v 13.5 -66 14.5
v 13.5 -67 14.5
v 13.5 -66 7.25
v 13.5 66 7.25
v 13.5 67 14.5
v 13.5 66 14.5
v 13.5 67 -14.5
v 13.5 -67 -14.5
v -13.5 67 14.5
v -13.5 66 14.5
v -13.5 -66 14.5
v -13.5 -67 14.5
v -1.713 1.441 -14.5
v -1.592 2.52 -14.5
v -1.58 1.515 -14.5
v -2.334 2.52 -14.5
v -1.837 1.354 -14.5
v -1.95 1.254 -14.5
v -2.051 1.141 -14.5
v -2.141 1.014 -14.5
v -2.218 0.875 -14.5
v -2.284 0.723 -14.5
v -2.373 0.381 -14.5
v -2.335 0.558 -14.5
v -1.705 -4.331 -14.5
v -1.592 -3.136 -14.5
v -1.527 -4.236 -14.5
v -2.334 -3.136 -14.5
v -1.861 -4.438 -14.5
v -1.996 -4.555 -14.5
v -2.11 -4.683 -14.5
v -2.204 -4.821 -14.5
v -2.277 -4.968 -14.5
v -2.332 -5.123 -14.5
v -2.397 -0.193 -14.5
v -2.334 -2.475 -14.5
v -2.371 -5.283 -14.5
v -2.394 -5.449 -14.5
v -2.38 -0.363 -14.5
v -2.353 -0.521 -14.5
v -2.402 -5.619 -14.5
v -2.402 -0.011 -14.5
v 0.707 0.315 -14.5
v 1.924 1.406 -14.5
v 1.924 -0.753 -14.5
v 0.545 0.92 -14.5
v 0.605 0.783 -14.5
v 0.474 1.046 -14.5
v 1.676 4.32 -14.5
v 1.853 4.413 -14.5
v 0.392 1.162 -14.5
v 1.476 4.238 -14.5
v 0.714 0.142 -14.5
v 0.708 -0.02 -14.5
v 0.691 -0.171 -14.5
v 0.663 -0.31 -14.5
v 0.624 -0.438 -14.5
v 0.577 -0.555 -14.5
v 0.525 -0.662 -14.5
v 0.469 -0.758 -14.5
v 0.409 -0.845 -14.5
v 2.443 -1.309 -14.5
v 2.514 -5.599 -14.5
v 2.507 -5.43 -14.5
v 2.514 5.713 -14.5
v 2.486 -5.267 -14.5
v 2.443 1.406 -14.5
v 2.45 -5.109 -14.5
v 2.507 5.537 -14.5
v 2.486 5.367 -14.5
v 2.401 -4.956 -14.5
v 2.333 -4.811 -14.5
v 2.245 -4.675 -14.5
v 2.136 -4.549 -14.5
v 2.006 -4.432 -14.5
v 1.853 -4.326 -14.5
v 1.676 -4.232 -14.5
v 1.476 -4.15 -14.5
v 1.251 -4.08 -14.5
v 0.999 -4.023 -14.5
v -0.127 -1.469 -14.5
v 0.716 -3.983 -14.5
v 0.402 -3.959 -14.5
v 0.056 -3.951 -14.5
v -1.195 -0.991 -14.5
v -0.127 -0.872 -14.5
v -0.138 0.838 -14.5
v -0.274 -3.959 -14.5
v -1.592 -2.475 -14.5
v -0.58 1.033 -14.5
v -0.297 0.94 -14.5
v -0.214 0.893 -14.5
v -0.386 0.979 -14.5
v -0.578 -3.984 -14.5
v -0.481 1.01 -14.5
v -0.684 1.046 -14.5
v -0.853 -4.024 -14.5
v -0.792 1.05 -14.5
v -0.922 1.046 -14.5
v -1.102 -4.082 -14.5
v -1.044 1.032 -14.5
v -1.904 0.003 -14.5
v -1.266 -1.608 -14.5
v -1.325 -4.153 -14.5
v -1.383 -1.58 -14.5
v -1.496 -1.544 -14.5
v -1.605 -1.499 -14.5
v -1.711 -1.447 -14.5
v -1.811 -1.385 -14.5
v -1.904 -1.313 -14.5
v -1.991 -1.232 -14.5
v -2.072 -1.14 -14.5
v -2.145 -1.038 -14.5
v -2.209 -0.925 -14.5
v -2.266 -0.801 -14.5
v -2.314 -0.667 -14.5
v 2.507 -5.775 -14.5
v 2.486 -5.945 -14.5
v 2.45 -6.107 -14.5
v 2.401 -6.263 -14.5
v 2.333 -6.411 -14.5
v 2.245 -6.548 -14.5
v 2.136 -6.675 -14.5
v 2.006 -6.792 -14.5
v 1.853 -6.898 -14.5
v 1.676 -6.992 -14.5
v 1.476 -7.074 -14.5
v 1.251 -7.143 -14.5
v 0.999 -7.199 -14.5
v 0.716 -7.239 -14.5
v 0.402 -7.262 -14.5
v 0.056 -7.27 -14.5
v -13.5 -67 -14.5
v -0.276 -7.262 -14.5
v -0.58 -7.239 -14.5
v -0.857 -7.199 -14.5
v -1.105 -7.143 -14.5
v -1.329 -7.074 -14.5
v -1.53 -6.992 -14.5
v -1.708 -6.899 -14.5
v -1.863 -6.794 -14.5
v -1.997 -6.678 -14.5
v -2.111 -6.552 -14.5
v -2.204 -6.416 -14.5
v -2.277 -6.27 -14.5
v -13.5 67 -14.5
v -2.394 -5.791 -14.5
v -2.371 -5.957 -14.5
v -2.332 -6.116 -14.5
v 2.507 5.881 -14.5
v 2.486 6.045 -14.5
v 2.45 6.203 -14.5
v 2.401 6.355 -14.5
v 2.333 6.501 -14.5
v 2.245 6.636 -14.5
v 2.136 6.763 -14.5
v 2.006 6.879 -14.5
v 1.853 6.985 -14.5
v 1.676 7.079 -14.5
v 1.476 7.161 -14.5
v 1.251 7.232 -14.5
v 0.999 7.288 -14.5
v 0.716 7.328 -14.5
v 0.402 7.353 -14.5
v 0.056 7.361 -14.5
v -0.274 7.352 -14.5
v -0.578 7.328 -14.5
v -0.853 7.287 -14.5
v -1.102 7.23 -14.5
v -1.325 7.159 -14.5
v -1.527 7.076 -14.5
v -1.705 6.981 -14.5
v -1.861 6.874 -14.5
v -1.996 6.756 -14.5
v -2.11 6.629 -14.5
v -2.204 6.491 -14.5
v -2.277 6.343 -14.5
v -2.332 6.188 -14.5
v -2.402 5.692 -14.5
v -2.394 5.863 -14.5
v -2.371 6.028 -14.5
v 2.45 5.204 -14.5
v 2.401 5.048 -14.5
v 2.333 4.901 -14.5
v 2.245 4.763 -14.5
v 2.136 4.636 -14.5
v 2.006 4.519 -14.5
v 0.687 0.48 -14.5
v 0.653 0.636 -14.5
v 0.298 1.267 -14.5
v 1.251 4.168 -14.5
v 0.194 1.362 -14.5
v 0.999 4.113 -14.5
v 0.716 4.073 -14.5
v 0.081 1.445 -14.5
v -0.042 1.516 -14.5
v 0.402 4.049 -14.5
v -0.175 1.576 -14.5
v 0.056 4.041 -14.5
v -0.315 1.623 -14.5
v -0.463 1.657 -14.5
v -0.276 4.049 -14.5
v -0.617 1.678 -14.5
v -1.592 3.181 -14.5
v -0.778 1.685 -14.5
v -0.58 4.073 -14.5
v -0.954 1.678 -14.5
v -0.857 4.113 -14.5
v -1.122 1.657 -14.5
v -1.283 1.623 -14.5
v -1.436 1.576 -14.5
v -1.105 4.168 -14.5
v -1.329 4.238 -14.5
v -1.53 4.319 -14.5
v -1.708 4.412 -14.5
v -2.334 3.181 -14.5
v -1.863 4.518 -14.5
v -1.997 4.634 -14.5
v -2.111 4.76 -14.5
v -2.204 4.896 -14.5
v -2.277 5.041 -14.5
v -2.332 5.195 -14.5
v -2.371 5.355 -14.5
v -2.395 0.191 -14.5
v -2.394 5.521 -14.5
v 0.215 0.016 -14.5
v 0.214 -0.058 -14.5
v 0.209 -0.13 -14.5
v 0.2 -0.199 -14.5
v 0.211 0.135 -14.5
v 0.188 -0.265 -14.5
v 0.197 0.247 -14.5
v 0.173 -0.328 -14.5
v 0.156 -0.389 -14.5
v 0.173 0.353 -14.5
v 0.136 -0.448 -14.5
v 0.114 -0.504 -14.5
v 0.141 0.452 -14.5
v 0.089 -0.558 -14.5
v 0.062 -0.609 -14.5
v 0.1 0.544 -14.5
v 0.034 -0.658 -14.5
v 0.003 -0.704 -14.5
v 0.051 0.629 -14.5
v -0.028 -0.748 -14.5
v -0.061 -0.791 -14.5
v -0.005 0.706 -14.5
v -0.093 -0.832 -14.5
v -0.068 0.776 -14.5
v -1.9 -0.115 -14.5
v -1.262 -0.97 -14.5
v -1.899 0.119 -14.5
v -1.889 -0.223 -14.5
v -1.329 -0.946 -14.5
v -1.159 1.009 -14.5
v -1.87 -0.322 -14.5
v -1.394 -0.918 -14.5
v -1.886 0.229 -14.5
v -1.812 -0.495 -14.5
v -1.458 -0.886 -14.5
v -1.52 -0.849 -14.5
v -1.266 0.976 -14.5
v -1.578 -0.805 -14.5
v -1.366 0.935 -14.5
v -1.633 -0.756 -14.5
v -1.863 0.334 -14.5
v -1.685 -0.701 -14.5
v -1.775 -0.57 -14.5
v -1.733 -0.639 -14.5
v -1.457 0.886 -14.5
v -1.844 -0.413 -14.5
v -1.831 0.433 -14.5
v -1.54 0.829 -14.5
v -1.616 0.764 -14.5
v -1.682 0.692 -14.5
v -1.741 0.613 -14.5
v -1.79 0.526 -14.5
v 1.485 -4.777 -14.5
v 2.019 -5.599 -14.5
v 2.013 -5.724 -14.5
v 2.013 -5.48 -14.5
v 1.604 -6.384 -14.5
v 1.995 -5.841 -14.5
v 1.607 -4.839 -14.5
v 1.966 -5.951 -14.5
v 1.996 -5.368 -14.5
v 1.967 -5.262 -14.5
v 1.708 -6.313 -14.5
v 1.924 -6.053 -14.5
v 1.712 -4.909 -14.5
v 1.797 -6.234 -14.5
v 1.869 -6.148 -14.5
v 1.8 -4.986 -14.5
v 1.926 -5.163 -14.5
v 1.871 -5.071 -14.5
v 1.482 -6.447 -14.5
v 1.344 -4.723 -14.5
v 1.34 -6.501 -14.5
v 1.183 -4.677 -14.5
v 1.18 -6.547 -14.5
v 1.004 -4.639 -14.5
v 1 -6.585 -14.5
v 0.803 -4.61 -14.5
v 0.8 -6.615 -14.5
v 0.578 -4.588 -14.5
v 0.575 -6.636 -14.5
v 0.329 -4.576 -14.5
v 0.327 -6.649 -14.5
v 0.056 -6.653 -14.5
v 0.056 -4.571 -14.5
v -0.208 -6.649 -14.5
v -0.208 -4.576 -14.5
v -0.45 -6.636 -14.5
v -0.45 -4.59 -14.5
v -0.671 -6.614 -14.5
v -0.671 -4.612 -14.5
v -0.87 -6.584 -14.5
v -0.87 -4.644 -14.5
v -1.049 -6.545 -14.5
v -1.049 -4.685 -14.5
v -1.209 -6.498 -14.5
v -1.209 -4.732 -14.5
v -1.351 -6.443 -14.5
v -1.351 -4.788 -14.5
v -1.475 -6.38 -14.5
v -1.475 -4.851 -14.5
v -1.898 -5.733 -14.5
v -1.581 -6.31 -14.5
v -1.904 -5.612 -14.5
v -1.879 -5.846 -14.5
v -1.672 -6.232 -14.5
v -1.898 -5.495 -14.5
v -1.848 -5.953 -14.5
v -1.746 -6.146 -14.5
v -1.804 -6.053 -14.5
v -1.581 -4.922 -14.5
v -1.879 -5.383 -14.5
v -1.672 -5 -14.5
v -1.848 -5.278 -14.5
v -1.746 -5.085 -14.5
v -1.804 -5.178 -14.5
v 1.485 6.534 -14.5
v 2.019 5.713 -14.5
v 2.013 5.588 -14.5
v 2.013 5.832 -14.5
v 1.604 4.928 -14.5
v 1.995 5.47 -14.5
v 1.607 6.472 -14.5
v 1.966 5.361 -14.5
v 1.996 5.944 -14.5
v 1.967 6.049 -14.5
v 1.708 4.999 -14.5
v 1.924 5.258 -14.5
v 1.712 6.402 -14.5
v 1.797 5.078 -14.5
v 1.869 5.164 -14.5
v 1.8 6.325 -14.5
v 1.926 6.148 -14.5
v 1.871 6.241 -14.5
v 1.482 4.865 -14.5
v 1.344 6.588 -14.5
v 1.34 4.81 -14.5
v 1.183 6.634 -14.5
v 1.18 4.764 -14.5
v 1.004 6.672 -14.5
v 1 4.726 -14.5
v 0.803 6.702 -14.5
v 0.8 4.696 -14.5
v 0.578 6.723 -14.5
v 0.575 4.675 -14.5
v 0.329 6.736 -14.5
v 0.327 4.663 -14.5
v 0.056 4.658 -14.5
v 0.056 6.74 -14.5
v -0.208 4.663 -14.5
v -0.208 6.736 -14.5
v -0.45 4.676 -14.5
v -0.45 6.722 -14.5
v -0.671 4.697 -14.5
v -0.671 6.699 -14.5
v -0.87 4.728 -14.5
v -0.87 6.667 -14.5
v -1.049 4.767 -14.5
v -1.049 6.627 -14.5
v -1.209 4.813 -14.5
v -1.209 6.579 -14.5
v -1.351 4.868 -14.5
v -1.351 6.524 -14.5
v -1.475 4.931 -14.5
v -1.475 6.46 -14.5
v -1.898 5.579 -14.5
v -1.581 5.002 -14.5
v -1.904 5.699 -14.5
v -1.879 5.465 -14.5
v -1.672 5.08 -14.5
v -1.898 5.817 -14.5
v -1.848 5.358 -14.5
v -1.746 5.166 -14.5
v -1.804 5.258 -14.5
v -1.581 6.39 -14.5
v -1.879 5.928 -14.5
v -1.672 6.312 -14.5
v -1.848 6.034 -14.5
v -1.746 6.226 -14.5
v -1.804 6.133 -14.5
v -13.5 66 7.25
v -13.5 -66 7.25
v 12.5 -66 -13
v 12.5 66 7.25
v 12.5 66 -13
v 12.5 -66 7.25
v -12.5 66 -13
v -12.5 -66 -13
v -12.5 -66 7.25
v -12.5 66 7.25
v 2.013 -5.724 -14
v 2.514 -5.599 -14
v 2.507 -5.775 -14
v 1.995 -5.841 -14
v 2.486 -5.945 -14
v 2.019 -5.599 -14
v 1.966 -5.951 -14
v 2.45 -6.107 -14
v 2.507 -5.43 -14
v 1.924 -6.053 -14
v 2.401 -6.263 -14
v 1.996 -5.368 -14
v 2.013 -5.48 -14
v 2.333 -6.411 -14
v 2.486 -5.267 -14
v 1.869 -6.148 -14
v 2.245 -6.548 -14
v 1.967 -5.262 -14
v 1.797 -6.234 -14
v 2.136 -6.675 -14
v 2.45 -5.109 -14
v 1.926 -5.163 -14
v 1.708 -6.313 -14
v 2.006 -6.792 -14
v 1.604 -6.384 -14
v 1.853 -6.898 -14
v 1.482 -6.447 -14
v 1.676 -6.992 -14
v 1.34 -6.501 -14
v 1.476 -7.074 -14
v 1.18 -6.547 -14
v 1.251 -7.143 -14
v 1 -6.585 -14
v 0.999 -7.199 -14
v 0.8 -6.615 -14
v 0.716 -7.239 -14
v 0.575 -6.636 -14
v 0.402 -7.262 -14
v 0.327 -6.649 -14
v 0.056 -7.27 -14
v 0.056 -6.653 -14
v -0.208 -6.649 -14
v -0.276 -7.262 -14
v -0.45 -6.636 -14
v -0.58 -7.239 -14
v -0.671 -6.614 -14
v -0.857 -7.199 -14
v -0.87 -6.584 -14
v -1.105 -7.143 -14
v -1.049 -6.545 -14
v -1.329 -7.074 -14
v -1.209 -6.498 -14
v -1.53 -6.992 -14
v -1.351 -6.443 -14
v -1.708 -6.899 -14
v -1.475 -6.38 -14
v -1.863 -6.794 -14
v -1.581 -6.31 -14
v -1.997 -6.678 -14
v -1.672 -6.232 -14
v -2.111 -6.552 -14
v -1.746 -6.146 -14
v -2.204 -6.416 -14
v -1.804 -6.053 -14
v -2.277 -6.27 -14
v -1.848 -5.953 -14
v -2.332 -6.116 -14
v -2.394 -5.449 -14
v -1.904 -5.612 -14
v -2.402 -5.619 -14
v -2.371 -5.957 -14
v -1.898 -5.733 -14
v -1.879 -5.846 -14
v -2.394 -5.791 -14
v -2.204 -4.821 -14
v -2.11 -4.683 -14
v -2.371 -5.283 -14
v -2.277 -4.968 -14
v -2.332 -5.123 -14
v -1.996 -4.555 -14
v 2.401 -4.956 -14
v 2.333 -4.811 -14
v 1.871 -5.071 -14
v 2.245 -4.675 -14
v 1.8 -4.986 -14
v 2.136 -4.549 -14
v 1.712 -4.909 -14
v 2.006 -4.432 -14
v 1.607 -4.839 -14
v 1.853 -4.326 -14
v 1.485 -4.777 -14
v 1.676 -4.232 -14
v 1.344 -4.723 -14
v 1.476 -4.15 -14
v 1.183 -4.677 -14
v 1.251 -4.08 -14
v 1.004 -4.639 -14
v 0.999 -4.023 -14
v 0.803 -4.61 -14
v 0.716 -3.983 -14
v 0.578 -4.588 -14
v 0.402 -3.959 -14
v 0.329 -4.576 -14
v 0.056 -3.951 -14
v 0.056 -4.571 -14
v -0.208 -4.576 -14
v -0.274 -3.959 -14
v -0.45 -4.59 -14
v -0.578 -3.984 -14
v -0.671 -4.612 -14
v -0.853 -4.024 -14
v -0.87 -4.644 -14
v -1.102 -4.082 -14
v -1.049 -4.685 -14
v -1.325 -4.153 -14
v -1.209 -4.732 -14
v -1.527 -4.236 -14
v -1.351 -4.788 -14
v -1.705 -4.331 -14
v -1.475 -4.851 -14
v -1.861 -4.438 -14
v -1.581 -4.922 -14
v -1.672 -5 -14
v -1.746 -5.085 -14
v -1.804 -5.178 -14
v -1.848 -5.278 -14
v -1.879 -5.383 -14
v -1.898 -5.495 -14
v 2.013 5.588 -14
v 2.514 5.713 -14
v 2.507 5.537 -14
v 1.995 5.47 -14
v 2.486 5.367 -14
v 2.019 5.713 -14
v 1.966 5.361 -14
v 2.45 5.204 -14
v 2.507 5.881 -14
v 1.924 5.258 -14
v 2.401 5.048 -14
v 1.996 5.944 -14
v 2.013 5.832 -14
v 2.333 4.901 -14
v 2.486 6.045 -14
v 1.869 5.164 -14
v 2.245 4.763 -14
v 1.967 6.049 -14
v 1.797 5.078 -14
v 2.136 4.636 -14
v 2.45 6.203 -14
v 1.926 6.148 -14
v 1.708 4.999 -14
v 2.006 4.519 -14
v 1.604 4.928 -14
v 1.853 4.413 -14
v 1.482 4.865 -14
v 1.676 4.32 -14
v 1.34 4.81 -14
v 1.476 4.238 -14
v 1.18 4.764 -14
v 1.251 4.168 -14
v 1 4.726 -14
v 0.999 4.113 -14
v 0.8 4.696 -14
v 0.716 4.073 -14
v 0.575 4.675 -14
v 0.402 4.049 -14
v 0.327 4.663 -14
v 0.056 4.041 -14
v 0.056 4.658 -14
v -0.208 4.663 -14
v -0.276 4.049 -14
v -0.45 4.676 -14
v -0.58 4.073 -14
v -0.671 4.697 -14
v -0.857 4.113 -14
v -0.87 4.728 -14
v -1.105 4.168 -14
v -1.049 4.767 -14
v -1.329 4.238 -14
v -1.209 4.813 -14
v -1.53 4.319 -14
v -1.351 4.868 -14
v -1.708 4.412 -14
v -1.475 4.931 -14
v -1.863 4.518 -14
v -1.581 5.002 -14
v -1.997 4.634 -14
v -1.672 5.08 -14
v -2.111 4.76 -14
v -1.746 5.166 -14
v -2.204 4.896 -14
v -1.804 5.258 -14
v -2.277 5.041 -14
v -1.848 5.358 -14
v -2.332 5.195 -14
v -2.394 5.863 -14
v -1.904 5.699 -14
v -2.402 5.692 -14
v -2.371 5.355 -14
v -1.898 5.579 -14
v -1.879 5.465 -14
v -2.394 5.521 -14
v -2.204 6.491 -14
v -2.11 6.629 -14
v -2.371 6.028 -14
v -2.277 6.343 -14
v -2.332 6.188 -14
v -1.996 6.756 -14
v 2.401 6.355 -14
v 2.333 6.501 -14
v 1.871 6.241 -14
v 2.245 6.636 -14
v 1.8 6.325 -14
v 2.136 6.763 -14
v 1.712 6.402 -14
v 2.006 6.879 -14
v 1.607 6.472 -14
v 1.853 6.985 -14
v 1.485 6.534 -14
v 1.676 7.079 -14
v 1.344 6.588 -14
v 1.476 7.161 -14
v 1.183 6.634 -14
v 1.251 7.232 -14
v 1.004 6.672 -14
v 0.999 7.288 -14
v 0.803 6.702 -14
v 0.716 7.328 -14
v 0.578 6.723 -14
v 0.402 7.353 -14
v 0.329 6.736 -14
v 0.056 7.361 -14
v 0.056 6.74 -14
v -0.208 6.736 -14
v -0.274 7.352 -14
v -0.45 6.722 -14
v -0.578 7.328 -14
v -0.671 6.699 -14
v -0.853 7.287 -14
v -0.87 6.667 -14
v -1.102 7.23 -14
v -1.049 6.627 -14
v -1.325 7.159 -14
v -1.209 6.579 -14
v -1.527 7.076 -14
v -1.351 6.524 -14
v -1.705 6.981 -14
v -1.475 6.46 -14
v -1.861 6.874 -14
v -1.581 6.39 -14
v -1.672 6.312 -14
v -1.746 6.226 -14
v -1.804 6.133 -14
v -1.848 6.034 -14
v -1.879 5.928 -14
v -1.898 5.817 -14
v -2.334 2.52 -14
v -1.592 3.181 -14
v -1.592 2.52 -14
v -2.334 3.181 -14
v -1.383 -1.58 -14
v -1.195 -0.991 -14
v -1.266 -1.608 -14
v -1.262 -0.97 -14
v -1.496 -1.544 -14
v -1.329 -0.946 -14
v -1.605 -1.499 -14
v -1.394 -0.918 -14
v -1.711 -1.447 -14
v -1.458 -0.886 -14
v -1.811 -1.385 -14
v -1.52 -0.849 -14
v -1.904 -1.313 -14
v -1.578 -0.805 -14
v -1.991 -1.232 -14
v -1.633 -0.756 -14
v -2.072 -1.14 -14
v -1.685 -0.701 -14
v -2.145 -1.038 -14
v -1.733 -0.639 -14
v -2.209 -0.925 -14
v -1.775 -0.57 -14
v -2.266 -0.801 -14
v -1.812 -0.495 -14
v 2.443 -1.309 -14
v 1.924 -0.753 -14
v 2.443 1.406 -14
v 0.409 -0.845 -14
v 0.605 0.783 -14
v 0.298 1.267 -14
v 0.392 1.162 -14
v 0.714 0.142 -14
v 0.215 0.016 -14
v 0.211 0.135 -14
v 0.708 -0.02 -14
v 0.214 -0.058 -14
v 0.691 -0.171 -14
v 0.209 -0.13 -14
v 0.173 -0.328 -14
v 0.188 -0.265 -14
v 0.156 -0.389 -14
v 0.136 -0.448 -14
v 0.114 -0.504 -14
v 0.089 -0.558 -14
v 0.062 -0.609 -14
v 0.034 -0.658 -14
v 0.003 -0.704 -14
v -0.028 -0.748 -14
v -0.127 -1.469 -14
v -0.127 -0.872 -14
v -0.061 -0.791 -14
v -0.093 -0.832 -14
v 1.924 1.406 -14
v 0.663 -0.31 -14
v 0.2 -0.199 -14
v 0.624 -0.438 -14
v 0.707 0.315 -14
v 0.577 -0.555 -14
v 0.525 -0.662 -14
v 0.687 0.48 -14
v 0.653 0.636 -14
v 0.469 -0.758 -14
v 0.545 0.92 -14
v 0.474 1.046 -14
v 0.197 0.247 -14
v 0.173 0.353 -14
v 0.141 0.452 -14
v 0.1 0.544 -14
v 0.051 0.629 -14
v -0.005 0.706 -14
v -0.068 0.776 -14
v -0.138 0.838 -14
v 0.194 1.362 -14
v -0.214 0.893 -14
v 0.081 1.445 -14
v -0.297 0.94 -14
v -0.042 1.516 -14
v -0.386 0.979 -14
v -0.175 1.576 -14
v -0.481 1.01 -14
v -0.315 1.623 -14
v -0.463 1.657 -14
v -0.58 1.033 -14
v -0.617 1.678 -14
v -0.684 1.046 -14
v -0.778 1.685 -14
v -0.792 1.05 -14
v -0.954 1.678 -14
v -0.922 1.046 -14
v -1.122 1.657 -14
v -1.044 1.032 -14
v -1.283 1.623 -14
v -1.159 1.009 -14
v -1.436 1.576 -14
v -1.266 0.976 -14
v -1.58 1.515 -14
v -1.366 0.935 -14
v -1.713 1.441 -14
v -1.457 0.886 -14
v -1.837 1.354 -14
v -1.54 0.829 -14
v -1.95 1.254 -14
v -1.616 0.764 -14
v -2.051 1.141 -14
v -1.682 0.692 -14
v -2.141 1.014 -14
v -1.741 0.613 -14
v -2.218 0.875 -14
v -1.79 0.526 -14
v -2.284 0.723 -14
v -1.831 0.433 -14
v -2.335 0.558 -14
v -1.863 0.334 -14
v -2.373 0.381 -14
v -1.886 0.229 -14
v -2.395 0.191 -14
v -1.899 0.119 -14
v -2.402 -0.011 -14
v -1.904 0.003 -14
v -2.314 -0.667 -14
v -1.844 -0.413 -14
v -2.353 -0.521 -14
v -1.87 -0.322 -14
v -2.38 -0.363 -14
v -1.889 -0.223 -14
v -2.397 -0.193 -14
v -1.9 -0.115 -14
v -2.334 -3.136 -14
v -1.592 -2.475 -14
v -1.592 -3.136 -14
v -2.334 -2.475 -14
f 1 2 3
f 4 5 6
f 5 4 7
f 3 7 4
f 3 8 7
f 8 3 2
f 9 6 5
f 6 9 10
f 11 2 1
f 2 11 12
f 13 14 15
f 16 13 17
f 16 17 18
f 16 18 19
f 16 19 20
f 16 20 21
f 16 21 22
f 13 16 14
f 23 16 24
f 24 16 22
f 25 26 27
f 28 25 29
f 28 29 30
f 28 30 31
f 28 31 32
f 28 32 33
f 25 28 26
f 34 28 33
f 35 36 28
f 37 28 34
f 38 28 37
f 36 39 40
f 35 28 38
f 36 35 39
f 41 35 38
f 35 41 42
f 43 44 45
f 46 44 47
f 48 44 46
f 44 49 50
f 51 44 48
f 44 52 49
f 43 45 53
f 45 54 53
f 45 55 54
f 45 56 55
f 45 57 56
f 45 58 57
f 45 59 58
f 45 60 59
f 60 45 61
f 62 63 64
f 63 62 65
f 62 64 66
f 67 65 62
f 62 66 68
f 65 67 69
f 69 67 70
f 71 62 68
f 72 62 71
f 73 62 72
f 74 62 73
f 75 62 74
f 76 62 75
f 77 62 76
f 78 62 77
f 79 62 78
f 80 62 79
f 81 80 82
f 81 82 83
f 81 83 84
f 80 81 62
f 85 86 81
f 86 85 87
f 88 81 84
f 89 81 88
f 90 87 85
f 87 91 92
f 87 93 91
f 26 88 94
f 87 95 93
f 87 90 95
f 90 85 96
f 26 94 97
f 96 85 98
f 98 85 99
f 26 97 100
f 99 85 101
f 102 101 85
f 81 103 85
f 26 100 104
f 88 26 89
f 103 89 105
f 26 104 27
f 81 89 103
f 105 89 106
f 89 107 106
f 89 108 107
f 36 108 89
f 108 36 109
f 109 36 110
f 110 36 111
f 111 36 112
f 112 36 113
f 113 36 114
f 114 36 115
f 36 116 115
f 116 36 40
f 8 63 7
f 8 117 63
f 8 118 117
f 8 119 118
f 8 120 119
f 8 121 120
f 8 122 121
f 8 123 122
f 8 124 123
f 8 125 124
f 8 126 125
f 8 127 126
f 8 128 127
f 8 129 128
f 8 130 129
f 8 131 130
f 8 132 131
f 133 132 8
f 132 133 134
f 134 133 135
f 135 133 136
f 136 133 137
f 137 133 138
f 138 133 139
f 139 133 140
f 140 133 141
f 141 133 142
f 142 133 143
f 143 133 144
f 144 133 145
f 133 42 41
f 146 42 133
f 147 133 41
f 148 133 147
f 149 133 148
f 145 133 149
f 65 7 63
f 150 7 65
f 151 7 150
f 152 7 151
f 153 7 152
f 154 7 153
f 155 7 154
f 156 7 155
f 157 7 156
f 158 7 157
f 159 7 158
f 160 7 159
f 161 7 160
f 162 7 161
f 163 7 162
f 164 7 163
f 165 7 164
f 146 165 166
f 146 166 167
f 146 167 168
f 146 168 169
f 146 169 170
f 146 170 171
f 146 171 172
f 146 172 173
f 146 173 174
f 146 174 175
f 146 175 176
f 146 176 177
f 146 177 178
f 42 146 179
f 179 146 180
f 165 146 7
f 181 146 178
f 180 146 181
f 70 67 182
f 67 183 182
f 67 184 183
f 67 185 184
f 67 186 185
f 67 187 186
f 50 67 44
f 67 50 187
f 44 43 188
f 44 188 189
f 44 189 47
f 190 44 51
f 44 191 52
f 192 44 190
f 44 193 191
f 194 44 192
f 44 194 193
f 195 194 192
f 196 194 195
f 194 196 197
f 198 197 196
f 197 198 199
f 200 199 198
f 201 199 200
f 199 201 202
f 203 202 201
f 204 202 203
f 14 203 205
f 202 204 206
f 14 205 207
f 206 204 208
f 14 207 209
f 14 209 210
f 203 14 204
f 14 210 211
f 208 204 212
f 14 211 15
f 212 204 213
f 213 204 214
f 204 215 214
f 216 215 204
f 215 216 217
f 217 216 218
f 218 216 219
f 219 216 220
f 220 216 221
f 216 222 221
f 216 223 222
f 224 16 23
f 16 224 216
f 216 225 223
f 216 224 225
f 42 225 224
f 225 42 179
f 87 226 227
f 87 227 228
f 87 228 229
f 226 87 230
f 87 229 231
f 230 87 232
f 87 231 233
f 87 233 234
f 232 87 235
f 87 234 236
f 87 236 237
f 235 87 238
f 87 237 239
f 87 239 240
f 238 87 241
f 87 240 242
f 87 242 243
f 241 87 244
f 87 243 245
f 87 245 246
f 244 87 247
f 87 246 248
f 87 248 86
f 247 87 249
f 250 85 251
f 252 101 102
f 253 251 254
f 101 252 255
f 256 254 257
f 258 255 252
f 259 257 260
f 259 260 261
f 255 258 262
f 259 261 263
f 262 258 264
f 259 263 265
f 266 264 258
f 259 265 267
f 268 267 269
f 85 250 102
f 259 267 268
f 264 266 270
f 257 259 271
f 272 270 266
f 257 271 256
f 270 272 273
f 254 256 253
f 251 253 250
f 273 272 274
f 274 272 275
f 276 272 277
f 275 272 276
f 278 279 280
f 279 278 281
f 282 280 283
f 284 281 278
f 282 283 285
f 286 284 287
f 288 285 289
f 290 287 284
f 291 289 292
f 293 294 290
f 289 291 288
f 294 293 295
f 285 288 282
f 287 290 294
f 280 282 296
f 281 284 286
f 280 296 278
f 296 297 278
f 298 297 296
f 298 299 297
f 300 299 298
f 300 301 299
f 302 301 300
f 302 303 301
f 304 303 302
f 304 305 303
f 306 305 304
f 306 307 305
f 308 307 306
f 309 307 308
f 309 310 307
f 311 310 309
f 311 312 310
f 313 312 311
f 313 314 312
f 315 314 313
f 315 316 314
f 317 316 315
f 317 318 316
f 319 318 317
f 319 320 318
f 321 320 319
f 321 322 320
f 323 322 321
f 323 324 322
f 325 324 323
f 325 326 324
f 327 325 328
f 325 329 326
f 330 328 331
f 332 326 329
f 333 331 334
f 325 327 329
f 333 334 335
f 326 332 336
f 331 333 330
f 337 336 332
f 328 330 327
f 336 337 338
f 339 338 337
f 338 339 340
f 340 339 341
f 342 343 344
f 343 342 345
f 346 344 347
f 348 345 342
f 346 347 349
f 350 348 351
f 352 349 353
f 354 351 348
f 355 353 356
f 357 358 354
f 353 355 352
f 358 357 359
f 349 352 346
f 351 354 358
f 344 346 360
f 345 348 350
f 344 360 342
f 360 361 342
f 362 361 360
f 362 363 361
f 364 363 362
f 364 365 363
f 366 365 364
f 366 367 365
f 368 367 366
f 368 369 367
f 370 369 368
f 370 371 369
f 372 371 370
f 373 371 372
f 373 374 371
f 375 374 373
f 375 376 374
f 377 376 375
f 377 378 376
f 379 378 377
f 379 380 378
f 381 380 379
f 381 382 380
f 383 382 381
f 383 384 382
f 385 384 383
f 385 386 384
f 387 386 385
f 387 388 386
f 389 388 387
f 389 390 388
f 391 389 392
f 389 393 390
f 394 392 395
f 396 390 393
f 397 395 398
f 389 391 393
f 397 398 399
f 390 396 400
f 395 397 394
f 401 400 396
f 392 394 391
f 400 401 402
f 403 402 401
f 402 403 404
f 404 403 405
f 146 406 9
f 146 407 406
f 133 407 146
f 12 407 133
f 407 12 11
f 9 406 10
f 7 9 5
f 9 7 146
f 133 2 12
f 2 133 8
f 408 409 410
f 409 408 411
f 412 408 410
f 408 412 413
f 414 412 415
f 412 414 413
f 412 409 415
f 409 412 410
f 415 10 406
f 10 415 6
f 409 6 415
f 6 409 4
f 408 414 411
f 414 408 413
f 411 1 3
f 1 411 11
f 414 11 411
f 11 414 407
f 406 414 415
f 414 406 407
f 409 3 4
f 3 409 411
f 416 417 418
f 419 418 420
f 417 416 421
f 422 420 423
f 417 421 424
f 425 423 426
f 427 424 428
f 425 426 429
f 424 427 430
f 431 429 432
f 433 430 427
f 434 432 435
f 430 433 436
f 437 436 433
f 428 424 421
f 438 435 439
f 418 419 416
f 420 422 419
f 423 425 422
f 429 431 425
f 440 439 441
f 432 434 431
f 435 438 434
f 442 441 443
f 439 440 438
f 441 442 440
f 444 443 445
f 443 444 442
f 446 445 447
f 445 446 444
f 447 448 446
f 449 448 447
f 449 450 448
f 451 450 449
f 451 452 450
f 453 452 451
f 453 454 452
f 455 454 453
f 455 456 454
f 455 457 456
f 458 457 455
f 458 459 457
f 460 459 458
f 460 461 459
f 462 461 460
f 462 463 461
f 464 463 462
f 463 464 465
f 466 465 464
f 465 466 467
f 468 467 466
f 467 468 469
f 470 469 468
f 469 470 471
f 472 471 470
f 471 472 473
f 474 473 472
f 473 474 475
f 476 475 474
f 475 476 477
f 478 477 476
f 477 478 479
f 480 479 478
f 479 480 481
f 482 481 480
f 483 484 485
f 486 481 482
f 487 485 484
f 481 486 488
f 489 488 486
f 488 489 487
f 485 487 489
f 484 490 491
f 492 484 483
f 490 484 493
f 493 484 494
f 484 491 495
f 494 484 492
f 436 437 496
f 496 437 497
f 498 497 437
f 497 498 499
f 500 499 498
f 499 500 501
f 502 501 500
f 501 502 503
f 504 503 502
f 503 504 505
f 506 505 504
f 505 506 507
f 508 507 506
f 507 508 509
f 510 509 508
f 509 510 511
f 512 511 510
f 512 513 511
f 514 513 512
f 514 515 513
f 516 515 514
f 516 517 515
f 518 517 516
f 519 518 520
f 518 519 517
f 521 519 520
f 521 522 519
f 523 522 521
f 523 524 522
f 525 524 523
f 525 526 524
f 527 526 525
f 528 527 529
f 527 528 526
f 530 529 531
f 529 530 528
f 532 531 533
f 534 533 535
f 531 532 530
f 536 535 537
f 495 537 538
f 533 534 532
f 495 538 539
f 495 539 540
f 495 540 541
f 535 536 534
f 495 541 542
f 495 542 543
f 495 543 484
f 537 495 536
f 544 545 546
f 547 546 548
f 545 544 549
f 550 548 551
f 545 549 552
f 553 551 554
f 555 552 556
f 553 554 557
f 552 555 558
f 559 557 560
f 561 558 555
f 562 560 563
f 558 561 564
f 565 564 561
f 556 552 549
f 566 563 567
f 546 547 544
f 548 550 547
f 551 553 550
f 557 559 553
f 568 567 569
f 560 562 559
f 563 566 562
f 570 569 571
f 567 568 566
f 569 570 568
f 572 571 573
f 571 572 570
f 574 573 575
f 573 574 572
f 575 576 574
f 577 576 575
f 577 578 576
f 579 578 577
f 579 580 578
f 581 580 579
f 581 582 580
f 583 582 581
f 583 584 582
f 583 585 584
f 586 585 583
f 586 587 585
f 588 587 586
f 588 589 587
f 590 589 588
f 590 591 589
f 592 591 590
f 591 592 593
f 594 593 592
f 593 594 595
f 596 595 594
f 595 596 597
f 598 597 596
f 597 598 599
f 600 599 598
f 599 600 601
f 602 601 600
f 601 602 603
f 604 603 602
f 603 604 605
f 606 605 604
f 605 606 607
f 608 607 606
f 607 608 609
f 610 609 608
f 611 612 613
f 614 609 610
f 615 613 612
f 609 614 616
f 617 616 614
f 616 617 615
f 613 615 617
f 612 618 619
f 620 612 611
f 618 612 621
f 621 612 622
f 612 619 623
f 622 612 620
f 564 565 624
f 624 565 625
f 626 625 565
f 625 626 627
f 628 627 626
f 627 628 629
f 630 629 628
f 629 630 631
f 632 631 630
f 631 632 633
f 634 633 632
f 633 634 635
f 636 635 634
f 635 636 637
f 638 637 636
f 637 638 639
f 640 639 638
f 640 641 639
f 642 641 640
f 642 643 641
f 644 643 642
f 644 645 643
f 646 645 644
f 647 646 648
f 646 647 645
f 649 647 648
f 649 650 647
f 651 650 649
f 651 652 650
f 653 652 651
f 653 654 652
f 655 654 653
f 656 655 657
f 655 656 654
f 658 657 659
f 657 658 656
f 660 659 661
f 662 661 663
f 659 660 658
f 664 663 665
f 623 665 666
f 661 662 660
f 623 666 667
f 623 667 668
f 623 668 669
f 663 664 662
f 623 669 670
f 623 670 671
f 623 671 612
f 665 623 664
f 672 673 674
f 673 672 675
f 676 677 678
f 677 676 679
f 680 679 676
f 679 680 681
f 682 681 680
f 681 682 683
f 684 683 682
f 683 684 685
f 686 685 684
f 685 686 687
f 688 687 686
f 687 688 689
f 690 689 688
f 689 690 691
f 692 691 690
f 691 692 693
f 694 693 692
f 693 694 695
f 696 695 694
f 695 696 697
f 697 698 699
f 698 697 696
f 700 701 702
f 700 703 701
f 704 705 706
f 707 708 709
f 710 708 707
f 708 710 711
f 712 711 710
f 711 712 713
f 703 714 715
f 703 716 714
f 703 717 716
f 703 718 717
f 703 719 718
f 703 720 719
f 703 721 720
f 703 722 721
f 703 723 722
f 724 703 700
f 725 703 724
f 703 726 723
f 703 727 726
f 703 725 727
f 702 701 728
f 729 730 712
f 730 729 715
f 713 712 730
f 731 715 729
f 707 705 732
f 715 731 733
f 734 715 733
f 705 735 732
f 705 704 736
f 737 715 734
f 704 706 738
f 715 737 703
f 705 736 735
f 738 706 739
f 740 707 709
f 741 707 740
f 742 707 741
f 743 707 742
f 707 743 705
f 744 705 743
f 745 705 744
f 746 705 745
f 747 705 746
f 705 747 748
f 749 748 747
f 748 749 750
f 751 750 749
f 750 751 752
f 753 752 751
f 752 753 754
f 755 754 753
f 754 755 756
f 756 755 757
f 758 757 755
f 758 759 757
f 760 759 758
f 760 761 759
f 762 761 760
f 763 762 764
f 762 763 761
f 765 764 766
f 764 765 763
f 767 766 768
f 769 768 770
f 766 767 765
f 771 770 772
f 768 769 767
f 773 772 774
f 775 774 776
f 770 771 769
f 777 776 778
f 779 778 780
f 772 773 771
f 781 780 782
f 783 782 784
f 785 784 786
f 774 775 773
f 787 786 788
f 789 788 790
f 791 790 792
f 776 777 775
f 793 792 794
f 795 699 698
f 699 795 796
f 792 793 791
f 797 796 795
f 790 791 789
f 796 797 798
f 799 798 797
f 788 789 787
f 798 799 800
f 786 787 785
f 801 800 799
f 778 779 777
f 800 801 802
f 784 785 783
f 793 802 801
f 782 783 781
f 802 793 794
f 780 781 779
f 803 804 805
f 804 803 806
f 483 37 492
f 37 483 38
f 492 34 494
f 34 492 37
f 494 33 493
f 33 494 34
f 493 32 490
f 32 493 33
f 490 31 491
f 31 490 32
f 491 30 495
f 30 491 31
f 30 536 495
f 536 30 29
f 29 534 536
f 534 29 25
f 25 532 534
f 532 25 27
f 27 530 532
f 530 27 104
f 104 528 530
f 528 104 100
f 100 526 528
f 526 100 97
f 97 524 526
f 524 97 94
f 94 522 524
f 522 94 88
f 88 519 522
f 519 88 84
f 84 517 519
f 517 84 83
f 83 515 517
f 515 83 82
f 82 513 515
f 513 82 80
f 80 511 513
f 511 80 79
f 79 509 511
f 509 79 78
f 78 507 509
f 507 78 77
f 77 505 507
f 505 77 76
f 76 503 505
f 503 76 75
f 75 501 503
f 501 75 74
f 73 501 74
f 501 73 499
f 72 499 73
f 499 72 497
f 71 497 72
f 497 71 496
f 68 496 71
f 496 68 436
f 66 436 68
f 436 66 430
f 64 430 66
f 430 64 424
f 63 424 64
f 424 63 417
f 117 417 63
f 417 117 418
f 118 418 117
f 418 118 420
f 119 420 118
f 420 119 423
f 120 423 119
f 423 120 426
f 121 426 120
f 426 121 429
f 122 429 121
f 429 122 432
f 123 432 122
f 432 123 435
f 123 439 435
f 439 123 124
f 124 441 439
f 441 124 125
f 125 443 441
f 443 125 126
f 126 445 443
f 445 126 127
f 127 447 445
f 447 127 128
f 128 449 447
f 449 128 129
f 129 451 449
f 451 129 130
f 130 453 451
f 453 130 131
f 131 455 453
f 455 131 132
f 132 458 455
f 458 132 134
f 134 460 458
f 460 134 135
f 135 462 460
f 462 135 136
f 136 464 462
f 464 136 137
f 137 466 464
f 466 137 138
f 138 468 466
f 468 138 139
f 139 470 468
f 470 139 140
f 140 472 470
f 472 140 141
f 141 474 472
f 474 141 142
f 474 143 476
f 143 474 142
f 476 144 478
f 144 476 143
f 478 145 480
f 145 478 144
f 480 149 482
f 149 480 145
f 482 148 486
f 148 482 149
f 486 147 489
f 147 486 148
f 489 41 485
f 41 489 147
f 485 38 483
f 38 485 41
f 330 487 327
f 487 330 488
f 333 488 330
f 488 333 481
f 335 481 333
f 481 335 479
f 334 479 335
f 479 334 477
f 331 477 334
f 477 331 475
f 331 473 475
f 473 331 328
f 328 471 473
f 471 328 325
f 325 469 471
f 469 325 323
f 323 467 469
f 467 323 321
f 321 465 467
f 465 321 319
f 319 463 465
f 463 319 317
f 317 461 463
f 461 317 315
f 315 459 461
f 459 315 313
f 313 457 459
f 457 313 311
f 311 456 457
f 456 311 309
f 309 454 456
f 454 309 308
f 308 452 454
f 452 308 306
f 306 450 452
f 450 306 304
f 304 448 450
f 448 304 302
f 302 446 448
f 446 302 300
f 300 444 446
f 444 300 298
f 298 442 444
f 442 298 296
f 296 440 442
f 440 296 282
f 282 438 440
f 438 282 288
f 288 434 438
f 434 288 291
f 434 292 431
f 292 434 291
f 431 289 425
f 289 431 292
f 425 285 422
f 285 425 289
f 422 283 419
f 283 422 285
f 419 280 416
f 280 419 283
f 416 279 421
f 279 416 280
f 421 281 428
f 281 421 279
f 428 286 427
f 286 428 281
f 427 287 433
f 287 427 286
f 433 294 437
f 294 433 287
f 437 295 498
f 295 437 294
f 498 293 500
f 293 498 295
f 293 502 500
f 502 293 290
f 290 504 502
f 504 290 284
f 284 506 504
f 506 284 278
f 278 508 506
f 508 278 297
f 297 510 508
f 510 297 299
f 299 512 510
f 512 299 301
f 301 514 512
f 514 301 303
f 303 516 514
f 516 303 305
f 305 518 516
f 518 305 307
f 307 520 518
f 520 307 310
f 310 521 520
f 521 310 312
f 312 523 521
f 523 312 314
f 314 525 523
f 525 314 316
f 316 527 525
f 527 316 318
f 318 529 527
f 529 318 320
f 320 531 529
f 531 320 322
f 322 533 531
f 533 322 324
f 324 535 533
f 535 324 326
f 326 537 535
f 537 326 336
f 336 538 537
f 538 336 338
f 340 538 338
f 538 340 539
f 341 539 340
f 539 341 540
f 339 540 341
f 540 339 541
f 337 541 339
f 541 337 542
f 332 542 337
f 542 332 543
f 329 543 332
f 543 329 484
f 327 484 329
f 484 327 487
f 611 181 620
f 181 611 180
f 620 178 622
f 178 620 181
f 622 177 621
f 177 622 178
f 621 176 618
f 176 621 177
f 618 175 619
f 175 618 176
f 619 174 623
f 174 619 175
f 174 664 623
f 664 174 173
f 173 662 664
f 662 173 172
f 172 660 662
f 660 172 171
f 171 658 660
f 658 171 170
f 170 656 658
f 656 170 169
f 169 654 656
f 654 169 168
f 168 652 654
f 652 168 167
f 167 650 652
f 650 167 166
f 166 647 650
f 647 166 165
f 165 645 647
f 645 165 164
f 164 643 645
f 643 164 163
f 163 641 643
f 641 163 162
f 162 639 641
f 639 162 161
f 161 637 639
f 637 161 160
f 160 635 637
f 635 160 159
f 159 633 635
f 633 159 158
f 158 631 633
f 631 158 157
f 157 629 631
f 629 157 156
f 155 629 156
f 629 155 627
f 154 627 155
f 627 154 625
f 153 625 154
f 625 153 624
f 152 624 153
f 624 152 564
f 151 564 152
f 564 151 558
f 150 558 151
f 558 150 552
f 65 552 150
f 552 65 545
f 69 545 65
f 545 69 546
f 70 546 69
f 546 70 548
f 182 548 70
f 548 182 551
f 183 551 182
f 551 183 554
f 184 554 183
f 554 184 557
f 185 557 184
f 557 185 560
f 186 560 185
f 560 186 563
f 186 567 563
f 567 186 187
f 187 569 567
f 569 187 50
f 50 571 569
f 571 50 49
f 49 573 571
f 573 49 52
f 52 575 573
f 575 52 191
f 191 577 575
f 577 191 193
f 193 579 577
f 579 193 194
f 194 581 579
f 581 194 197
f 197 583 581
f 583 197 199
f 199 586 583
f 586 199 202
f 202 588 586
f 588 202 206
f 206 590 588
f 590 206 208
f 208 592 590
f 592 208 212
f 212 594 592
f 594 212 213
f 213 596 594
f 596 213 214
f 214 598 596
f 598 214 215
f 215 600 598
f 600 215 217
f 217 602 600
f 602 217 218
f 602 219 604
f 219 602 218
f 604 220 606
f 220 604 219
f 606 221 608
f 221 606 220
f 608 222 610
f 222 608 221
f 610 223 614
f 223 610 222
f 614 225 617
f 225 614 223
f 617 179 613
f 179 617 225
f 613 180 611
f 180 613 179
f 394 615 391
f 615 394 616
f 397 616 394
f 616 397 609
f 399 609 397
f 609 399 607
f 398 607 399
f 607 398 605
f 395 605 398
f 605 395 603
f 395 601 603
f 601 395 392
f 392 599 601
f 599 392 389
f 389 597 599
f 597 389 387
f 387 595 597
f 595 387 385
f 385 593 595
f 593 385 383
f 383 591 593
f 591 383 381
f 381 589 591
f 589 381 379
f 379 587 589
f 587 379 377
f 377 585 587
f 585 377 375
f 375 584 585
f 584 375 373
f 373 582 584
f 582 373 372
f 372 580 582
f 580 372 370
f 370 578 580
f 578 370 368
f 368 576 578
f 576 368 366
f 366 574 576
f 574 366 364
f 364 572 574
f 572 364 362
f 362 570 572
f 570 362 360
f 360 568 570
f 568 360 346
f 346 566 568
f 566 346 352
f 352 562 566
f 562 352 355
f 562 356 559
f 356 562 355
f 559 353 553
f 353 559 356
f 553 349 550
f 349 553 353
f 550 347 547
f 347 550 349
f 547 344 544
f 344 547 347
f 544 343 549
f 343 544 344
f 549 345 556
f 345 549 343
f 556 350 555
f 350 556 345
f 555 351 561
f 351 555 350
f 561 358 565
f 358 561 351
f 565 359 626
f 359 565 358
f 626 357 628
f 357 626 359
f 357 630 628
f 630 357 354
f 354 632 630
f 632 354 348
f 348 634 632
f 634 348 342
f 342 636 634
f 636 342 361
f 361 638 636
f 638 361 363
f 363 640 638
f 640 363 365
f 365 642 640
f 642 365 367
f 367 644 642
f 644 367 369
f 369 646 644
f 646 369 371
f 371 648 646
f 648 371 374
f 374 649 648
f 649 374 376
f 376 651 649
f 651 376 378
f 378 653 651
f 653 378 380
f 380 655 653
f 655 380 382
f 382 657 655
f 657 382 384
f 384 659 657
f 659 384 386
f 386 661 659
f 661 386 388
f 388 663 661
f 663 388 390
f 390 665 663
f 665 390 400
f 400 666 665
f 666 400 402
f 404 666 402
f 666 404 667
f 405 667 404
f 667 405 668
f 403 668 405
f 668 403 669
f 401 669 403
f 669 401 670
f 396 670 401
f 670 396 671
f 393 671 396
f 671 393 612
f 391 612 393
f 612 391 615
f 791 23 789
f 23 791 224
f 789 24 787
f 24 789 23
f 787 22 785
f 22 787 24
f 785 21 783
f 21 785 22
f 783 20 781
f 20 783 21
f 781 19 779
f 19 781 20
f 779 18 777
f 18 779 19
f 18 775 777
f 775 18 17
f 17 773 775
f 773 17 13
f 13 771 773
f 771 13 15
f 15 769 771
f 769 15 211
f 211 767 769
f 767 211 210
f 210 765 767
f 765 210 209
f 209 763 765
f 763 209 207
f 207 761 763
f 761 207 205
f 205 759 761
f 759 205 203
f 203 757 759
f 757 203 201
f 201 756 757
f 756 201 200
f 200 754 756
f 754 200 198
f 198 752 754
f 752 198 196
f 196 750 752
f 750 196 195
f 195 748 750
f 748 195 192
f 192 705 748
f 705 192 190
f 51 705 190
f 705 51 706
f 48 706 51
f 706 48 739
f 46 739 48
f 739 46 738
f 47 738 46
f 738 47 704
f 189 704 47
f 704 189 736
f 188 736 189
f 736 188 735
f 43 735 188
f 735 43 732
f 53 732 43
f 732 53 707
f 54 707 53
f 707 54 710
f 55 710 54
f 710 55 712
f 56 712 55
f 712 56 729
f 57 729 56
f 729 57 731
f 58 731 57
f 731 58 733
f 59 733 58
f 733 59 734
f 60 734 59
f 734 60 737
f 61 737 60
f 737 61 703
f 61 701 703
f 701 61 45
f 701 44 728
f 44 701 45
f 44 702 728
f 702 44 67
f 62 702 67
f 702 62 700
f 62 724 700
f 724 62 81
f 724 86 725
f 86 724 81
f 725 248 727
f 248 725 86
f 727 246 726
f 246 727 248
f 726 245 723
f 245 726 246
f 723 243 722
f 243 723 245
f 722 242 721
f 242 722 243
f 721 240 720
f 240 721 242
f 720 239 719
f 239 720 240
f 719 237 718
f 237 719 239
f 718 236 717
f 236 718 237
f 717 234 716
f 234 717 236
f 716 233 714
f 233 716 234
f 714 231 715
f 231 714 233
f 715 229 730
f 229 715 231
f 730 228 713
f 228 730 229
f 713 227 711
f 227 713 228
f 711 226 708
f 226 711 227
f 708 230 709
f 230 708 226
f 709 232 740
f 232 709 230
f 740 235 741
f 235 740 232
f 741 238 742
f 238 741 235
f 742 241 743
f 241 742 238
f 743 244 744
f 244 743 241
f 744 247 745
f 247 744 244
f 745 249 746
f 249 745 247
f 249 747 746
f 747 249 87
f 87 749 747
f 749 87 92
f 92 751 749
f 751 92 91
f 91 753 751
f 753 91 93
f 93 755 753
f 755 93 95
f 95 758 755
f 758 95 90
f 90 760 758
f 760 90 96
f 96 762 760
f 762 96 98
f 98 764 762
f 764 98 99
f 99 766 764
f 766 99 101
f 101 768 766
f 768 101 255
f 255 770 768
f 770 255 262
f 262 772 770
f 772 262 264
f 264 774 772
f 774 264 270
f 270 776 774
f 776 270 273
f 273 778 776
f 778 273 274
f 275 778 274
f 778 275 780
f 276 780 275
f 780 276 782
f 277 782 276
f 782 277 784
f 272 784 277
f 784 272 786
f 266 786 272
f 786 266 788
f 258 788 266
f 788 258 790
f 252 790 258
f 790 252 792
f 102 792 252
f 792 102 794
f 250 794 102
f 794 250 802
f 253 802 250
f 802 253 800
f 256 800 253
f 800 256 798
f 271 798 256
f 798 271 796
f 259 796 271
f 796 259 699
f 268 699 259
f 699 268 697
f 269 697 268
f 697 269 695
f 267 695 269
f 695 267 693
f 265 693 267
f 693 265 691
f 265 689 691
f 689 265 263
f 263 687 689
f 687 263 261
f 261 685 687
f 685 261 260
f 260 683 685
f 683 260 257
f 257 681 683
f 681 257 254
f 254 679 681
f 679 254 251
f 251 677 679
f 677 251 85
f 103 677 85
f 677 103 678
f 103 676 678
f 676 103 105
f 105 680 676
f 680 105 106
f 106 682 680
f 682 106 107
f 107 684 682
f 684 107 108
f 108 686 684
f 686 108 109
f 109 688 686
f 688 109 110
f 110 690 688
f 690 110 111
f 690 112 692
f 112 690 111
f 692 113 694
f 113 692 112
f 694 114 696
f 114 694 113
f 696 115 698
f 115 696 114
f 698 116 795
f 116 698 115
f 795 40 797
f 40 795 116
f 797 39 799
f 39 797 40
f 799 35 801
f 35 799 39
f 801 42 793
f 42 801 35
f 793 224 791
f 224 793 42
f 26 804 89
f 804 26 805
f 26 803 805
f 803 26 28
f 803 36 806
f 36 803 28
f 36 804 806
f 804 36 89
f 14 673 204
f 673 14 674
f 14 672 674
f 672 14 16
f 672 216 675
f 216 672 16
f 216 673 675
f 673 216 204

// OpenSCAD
version = "0.5.0";

function toUnits(inches=0, sixteenths=0) = (inches * 16) + sixteenths;

channelLength = toUnits(8,4);
channelWidth = toUnits(1,9);
channelDepth = toUnits(1,12);

shellLength = channelLength + 2;
shellWidth = channelWidth + 2;
shellDepth = channelDepth + 1;

difference() {
  cube ([shellWidth, shellLength, shellDepth], true);
  translate ([0,0, 1]) cube ([channelWidth, channelLength, channelDepth], true);
    translate ([0,0, 3 * shellDepth / 4]) cube ([shellWidth+2, channelLength, shellDepth ], true);
        translate ([0, 0, - (shellDepth/2) + 0.5 ])
        rotate ([0,180,270])
            linear_extrude (1) {
                scale (.5, .5, .5)
                text(version, halign = "center", valign = "center");
            } ;
}
